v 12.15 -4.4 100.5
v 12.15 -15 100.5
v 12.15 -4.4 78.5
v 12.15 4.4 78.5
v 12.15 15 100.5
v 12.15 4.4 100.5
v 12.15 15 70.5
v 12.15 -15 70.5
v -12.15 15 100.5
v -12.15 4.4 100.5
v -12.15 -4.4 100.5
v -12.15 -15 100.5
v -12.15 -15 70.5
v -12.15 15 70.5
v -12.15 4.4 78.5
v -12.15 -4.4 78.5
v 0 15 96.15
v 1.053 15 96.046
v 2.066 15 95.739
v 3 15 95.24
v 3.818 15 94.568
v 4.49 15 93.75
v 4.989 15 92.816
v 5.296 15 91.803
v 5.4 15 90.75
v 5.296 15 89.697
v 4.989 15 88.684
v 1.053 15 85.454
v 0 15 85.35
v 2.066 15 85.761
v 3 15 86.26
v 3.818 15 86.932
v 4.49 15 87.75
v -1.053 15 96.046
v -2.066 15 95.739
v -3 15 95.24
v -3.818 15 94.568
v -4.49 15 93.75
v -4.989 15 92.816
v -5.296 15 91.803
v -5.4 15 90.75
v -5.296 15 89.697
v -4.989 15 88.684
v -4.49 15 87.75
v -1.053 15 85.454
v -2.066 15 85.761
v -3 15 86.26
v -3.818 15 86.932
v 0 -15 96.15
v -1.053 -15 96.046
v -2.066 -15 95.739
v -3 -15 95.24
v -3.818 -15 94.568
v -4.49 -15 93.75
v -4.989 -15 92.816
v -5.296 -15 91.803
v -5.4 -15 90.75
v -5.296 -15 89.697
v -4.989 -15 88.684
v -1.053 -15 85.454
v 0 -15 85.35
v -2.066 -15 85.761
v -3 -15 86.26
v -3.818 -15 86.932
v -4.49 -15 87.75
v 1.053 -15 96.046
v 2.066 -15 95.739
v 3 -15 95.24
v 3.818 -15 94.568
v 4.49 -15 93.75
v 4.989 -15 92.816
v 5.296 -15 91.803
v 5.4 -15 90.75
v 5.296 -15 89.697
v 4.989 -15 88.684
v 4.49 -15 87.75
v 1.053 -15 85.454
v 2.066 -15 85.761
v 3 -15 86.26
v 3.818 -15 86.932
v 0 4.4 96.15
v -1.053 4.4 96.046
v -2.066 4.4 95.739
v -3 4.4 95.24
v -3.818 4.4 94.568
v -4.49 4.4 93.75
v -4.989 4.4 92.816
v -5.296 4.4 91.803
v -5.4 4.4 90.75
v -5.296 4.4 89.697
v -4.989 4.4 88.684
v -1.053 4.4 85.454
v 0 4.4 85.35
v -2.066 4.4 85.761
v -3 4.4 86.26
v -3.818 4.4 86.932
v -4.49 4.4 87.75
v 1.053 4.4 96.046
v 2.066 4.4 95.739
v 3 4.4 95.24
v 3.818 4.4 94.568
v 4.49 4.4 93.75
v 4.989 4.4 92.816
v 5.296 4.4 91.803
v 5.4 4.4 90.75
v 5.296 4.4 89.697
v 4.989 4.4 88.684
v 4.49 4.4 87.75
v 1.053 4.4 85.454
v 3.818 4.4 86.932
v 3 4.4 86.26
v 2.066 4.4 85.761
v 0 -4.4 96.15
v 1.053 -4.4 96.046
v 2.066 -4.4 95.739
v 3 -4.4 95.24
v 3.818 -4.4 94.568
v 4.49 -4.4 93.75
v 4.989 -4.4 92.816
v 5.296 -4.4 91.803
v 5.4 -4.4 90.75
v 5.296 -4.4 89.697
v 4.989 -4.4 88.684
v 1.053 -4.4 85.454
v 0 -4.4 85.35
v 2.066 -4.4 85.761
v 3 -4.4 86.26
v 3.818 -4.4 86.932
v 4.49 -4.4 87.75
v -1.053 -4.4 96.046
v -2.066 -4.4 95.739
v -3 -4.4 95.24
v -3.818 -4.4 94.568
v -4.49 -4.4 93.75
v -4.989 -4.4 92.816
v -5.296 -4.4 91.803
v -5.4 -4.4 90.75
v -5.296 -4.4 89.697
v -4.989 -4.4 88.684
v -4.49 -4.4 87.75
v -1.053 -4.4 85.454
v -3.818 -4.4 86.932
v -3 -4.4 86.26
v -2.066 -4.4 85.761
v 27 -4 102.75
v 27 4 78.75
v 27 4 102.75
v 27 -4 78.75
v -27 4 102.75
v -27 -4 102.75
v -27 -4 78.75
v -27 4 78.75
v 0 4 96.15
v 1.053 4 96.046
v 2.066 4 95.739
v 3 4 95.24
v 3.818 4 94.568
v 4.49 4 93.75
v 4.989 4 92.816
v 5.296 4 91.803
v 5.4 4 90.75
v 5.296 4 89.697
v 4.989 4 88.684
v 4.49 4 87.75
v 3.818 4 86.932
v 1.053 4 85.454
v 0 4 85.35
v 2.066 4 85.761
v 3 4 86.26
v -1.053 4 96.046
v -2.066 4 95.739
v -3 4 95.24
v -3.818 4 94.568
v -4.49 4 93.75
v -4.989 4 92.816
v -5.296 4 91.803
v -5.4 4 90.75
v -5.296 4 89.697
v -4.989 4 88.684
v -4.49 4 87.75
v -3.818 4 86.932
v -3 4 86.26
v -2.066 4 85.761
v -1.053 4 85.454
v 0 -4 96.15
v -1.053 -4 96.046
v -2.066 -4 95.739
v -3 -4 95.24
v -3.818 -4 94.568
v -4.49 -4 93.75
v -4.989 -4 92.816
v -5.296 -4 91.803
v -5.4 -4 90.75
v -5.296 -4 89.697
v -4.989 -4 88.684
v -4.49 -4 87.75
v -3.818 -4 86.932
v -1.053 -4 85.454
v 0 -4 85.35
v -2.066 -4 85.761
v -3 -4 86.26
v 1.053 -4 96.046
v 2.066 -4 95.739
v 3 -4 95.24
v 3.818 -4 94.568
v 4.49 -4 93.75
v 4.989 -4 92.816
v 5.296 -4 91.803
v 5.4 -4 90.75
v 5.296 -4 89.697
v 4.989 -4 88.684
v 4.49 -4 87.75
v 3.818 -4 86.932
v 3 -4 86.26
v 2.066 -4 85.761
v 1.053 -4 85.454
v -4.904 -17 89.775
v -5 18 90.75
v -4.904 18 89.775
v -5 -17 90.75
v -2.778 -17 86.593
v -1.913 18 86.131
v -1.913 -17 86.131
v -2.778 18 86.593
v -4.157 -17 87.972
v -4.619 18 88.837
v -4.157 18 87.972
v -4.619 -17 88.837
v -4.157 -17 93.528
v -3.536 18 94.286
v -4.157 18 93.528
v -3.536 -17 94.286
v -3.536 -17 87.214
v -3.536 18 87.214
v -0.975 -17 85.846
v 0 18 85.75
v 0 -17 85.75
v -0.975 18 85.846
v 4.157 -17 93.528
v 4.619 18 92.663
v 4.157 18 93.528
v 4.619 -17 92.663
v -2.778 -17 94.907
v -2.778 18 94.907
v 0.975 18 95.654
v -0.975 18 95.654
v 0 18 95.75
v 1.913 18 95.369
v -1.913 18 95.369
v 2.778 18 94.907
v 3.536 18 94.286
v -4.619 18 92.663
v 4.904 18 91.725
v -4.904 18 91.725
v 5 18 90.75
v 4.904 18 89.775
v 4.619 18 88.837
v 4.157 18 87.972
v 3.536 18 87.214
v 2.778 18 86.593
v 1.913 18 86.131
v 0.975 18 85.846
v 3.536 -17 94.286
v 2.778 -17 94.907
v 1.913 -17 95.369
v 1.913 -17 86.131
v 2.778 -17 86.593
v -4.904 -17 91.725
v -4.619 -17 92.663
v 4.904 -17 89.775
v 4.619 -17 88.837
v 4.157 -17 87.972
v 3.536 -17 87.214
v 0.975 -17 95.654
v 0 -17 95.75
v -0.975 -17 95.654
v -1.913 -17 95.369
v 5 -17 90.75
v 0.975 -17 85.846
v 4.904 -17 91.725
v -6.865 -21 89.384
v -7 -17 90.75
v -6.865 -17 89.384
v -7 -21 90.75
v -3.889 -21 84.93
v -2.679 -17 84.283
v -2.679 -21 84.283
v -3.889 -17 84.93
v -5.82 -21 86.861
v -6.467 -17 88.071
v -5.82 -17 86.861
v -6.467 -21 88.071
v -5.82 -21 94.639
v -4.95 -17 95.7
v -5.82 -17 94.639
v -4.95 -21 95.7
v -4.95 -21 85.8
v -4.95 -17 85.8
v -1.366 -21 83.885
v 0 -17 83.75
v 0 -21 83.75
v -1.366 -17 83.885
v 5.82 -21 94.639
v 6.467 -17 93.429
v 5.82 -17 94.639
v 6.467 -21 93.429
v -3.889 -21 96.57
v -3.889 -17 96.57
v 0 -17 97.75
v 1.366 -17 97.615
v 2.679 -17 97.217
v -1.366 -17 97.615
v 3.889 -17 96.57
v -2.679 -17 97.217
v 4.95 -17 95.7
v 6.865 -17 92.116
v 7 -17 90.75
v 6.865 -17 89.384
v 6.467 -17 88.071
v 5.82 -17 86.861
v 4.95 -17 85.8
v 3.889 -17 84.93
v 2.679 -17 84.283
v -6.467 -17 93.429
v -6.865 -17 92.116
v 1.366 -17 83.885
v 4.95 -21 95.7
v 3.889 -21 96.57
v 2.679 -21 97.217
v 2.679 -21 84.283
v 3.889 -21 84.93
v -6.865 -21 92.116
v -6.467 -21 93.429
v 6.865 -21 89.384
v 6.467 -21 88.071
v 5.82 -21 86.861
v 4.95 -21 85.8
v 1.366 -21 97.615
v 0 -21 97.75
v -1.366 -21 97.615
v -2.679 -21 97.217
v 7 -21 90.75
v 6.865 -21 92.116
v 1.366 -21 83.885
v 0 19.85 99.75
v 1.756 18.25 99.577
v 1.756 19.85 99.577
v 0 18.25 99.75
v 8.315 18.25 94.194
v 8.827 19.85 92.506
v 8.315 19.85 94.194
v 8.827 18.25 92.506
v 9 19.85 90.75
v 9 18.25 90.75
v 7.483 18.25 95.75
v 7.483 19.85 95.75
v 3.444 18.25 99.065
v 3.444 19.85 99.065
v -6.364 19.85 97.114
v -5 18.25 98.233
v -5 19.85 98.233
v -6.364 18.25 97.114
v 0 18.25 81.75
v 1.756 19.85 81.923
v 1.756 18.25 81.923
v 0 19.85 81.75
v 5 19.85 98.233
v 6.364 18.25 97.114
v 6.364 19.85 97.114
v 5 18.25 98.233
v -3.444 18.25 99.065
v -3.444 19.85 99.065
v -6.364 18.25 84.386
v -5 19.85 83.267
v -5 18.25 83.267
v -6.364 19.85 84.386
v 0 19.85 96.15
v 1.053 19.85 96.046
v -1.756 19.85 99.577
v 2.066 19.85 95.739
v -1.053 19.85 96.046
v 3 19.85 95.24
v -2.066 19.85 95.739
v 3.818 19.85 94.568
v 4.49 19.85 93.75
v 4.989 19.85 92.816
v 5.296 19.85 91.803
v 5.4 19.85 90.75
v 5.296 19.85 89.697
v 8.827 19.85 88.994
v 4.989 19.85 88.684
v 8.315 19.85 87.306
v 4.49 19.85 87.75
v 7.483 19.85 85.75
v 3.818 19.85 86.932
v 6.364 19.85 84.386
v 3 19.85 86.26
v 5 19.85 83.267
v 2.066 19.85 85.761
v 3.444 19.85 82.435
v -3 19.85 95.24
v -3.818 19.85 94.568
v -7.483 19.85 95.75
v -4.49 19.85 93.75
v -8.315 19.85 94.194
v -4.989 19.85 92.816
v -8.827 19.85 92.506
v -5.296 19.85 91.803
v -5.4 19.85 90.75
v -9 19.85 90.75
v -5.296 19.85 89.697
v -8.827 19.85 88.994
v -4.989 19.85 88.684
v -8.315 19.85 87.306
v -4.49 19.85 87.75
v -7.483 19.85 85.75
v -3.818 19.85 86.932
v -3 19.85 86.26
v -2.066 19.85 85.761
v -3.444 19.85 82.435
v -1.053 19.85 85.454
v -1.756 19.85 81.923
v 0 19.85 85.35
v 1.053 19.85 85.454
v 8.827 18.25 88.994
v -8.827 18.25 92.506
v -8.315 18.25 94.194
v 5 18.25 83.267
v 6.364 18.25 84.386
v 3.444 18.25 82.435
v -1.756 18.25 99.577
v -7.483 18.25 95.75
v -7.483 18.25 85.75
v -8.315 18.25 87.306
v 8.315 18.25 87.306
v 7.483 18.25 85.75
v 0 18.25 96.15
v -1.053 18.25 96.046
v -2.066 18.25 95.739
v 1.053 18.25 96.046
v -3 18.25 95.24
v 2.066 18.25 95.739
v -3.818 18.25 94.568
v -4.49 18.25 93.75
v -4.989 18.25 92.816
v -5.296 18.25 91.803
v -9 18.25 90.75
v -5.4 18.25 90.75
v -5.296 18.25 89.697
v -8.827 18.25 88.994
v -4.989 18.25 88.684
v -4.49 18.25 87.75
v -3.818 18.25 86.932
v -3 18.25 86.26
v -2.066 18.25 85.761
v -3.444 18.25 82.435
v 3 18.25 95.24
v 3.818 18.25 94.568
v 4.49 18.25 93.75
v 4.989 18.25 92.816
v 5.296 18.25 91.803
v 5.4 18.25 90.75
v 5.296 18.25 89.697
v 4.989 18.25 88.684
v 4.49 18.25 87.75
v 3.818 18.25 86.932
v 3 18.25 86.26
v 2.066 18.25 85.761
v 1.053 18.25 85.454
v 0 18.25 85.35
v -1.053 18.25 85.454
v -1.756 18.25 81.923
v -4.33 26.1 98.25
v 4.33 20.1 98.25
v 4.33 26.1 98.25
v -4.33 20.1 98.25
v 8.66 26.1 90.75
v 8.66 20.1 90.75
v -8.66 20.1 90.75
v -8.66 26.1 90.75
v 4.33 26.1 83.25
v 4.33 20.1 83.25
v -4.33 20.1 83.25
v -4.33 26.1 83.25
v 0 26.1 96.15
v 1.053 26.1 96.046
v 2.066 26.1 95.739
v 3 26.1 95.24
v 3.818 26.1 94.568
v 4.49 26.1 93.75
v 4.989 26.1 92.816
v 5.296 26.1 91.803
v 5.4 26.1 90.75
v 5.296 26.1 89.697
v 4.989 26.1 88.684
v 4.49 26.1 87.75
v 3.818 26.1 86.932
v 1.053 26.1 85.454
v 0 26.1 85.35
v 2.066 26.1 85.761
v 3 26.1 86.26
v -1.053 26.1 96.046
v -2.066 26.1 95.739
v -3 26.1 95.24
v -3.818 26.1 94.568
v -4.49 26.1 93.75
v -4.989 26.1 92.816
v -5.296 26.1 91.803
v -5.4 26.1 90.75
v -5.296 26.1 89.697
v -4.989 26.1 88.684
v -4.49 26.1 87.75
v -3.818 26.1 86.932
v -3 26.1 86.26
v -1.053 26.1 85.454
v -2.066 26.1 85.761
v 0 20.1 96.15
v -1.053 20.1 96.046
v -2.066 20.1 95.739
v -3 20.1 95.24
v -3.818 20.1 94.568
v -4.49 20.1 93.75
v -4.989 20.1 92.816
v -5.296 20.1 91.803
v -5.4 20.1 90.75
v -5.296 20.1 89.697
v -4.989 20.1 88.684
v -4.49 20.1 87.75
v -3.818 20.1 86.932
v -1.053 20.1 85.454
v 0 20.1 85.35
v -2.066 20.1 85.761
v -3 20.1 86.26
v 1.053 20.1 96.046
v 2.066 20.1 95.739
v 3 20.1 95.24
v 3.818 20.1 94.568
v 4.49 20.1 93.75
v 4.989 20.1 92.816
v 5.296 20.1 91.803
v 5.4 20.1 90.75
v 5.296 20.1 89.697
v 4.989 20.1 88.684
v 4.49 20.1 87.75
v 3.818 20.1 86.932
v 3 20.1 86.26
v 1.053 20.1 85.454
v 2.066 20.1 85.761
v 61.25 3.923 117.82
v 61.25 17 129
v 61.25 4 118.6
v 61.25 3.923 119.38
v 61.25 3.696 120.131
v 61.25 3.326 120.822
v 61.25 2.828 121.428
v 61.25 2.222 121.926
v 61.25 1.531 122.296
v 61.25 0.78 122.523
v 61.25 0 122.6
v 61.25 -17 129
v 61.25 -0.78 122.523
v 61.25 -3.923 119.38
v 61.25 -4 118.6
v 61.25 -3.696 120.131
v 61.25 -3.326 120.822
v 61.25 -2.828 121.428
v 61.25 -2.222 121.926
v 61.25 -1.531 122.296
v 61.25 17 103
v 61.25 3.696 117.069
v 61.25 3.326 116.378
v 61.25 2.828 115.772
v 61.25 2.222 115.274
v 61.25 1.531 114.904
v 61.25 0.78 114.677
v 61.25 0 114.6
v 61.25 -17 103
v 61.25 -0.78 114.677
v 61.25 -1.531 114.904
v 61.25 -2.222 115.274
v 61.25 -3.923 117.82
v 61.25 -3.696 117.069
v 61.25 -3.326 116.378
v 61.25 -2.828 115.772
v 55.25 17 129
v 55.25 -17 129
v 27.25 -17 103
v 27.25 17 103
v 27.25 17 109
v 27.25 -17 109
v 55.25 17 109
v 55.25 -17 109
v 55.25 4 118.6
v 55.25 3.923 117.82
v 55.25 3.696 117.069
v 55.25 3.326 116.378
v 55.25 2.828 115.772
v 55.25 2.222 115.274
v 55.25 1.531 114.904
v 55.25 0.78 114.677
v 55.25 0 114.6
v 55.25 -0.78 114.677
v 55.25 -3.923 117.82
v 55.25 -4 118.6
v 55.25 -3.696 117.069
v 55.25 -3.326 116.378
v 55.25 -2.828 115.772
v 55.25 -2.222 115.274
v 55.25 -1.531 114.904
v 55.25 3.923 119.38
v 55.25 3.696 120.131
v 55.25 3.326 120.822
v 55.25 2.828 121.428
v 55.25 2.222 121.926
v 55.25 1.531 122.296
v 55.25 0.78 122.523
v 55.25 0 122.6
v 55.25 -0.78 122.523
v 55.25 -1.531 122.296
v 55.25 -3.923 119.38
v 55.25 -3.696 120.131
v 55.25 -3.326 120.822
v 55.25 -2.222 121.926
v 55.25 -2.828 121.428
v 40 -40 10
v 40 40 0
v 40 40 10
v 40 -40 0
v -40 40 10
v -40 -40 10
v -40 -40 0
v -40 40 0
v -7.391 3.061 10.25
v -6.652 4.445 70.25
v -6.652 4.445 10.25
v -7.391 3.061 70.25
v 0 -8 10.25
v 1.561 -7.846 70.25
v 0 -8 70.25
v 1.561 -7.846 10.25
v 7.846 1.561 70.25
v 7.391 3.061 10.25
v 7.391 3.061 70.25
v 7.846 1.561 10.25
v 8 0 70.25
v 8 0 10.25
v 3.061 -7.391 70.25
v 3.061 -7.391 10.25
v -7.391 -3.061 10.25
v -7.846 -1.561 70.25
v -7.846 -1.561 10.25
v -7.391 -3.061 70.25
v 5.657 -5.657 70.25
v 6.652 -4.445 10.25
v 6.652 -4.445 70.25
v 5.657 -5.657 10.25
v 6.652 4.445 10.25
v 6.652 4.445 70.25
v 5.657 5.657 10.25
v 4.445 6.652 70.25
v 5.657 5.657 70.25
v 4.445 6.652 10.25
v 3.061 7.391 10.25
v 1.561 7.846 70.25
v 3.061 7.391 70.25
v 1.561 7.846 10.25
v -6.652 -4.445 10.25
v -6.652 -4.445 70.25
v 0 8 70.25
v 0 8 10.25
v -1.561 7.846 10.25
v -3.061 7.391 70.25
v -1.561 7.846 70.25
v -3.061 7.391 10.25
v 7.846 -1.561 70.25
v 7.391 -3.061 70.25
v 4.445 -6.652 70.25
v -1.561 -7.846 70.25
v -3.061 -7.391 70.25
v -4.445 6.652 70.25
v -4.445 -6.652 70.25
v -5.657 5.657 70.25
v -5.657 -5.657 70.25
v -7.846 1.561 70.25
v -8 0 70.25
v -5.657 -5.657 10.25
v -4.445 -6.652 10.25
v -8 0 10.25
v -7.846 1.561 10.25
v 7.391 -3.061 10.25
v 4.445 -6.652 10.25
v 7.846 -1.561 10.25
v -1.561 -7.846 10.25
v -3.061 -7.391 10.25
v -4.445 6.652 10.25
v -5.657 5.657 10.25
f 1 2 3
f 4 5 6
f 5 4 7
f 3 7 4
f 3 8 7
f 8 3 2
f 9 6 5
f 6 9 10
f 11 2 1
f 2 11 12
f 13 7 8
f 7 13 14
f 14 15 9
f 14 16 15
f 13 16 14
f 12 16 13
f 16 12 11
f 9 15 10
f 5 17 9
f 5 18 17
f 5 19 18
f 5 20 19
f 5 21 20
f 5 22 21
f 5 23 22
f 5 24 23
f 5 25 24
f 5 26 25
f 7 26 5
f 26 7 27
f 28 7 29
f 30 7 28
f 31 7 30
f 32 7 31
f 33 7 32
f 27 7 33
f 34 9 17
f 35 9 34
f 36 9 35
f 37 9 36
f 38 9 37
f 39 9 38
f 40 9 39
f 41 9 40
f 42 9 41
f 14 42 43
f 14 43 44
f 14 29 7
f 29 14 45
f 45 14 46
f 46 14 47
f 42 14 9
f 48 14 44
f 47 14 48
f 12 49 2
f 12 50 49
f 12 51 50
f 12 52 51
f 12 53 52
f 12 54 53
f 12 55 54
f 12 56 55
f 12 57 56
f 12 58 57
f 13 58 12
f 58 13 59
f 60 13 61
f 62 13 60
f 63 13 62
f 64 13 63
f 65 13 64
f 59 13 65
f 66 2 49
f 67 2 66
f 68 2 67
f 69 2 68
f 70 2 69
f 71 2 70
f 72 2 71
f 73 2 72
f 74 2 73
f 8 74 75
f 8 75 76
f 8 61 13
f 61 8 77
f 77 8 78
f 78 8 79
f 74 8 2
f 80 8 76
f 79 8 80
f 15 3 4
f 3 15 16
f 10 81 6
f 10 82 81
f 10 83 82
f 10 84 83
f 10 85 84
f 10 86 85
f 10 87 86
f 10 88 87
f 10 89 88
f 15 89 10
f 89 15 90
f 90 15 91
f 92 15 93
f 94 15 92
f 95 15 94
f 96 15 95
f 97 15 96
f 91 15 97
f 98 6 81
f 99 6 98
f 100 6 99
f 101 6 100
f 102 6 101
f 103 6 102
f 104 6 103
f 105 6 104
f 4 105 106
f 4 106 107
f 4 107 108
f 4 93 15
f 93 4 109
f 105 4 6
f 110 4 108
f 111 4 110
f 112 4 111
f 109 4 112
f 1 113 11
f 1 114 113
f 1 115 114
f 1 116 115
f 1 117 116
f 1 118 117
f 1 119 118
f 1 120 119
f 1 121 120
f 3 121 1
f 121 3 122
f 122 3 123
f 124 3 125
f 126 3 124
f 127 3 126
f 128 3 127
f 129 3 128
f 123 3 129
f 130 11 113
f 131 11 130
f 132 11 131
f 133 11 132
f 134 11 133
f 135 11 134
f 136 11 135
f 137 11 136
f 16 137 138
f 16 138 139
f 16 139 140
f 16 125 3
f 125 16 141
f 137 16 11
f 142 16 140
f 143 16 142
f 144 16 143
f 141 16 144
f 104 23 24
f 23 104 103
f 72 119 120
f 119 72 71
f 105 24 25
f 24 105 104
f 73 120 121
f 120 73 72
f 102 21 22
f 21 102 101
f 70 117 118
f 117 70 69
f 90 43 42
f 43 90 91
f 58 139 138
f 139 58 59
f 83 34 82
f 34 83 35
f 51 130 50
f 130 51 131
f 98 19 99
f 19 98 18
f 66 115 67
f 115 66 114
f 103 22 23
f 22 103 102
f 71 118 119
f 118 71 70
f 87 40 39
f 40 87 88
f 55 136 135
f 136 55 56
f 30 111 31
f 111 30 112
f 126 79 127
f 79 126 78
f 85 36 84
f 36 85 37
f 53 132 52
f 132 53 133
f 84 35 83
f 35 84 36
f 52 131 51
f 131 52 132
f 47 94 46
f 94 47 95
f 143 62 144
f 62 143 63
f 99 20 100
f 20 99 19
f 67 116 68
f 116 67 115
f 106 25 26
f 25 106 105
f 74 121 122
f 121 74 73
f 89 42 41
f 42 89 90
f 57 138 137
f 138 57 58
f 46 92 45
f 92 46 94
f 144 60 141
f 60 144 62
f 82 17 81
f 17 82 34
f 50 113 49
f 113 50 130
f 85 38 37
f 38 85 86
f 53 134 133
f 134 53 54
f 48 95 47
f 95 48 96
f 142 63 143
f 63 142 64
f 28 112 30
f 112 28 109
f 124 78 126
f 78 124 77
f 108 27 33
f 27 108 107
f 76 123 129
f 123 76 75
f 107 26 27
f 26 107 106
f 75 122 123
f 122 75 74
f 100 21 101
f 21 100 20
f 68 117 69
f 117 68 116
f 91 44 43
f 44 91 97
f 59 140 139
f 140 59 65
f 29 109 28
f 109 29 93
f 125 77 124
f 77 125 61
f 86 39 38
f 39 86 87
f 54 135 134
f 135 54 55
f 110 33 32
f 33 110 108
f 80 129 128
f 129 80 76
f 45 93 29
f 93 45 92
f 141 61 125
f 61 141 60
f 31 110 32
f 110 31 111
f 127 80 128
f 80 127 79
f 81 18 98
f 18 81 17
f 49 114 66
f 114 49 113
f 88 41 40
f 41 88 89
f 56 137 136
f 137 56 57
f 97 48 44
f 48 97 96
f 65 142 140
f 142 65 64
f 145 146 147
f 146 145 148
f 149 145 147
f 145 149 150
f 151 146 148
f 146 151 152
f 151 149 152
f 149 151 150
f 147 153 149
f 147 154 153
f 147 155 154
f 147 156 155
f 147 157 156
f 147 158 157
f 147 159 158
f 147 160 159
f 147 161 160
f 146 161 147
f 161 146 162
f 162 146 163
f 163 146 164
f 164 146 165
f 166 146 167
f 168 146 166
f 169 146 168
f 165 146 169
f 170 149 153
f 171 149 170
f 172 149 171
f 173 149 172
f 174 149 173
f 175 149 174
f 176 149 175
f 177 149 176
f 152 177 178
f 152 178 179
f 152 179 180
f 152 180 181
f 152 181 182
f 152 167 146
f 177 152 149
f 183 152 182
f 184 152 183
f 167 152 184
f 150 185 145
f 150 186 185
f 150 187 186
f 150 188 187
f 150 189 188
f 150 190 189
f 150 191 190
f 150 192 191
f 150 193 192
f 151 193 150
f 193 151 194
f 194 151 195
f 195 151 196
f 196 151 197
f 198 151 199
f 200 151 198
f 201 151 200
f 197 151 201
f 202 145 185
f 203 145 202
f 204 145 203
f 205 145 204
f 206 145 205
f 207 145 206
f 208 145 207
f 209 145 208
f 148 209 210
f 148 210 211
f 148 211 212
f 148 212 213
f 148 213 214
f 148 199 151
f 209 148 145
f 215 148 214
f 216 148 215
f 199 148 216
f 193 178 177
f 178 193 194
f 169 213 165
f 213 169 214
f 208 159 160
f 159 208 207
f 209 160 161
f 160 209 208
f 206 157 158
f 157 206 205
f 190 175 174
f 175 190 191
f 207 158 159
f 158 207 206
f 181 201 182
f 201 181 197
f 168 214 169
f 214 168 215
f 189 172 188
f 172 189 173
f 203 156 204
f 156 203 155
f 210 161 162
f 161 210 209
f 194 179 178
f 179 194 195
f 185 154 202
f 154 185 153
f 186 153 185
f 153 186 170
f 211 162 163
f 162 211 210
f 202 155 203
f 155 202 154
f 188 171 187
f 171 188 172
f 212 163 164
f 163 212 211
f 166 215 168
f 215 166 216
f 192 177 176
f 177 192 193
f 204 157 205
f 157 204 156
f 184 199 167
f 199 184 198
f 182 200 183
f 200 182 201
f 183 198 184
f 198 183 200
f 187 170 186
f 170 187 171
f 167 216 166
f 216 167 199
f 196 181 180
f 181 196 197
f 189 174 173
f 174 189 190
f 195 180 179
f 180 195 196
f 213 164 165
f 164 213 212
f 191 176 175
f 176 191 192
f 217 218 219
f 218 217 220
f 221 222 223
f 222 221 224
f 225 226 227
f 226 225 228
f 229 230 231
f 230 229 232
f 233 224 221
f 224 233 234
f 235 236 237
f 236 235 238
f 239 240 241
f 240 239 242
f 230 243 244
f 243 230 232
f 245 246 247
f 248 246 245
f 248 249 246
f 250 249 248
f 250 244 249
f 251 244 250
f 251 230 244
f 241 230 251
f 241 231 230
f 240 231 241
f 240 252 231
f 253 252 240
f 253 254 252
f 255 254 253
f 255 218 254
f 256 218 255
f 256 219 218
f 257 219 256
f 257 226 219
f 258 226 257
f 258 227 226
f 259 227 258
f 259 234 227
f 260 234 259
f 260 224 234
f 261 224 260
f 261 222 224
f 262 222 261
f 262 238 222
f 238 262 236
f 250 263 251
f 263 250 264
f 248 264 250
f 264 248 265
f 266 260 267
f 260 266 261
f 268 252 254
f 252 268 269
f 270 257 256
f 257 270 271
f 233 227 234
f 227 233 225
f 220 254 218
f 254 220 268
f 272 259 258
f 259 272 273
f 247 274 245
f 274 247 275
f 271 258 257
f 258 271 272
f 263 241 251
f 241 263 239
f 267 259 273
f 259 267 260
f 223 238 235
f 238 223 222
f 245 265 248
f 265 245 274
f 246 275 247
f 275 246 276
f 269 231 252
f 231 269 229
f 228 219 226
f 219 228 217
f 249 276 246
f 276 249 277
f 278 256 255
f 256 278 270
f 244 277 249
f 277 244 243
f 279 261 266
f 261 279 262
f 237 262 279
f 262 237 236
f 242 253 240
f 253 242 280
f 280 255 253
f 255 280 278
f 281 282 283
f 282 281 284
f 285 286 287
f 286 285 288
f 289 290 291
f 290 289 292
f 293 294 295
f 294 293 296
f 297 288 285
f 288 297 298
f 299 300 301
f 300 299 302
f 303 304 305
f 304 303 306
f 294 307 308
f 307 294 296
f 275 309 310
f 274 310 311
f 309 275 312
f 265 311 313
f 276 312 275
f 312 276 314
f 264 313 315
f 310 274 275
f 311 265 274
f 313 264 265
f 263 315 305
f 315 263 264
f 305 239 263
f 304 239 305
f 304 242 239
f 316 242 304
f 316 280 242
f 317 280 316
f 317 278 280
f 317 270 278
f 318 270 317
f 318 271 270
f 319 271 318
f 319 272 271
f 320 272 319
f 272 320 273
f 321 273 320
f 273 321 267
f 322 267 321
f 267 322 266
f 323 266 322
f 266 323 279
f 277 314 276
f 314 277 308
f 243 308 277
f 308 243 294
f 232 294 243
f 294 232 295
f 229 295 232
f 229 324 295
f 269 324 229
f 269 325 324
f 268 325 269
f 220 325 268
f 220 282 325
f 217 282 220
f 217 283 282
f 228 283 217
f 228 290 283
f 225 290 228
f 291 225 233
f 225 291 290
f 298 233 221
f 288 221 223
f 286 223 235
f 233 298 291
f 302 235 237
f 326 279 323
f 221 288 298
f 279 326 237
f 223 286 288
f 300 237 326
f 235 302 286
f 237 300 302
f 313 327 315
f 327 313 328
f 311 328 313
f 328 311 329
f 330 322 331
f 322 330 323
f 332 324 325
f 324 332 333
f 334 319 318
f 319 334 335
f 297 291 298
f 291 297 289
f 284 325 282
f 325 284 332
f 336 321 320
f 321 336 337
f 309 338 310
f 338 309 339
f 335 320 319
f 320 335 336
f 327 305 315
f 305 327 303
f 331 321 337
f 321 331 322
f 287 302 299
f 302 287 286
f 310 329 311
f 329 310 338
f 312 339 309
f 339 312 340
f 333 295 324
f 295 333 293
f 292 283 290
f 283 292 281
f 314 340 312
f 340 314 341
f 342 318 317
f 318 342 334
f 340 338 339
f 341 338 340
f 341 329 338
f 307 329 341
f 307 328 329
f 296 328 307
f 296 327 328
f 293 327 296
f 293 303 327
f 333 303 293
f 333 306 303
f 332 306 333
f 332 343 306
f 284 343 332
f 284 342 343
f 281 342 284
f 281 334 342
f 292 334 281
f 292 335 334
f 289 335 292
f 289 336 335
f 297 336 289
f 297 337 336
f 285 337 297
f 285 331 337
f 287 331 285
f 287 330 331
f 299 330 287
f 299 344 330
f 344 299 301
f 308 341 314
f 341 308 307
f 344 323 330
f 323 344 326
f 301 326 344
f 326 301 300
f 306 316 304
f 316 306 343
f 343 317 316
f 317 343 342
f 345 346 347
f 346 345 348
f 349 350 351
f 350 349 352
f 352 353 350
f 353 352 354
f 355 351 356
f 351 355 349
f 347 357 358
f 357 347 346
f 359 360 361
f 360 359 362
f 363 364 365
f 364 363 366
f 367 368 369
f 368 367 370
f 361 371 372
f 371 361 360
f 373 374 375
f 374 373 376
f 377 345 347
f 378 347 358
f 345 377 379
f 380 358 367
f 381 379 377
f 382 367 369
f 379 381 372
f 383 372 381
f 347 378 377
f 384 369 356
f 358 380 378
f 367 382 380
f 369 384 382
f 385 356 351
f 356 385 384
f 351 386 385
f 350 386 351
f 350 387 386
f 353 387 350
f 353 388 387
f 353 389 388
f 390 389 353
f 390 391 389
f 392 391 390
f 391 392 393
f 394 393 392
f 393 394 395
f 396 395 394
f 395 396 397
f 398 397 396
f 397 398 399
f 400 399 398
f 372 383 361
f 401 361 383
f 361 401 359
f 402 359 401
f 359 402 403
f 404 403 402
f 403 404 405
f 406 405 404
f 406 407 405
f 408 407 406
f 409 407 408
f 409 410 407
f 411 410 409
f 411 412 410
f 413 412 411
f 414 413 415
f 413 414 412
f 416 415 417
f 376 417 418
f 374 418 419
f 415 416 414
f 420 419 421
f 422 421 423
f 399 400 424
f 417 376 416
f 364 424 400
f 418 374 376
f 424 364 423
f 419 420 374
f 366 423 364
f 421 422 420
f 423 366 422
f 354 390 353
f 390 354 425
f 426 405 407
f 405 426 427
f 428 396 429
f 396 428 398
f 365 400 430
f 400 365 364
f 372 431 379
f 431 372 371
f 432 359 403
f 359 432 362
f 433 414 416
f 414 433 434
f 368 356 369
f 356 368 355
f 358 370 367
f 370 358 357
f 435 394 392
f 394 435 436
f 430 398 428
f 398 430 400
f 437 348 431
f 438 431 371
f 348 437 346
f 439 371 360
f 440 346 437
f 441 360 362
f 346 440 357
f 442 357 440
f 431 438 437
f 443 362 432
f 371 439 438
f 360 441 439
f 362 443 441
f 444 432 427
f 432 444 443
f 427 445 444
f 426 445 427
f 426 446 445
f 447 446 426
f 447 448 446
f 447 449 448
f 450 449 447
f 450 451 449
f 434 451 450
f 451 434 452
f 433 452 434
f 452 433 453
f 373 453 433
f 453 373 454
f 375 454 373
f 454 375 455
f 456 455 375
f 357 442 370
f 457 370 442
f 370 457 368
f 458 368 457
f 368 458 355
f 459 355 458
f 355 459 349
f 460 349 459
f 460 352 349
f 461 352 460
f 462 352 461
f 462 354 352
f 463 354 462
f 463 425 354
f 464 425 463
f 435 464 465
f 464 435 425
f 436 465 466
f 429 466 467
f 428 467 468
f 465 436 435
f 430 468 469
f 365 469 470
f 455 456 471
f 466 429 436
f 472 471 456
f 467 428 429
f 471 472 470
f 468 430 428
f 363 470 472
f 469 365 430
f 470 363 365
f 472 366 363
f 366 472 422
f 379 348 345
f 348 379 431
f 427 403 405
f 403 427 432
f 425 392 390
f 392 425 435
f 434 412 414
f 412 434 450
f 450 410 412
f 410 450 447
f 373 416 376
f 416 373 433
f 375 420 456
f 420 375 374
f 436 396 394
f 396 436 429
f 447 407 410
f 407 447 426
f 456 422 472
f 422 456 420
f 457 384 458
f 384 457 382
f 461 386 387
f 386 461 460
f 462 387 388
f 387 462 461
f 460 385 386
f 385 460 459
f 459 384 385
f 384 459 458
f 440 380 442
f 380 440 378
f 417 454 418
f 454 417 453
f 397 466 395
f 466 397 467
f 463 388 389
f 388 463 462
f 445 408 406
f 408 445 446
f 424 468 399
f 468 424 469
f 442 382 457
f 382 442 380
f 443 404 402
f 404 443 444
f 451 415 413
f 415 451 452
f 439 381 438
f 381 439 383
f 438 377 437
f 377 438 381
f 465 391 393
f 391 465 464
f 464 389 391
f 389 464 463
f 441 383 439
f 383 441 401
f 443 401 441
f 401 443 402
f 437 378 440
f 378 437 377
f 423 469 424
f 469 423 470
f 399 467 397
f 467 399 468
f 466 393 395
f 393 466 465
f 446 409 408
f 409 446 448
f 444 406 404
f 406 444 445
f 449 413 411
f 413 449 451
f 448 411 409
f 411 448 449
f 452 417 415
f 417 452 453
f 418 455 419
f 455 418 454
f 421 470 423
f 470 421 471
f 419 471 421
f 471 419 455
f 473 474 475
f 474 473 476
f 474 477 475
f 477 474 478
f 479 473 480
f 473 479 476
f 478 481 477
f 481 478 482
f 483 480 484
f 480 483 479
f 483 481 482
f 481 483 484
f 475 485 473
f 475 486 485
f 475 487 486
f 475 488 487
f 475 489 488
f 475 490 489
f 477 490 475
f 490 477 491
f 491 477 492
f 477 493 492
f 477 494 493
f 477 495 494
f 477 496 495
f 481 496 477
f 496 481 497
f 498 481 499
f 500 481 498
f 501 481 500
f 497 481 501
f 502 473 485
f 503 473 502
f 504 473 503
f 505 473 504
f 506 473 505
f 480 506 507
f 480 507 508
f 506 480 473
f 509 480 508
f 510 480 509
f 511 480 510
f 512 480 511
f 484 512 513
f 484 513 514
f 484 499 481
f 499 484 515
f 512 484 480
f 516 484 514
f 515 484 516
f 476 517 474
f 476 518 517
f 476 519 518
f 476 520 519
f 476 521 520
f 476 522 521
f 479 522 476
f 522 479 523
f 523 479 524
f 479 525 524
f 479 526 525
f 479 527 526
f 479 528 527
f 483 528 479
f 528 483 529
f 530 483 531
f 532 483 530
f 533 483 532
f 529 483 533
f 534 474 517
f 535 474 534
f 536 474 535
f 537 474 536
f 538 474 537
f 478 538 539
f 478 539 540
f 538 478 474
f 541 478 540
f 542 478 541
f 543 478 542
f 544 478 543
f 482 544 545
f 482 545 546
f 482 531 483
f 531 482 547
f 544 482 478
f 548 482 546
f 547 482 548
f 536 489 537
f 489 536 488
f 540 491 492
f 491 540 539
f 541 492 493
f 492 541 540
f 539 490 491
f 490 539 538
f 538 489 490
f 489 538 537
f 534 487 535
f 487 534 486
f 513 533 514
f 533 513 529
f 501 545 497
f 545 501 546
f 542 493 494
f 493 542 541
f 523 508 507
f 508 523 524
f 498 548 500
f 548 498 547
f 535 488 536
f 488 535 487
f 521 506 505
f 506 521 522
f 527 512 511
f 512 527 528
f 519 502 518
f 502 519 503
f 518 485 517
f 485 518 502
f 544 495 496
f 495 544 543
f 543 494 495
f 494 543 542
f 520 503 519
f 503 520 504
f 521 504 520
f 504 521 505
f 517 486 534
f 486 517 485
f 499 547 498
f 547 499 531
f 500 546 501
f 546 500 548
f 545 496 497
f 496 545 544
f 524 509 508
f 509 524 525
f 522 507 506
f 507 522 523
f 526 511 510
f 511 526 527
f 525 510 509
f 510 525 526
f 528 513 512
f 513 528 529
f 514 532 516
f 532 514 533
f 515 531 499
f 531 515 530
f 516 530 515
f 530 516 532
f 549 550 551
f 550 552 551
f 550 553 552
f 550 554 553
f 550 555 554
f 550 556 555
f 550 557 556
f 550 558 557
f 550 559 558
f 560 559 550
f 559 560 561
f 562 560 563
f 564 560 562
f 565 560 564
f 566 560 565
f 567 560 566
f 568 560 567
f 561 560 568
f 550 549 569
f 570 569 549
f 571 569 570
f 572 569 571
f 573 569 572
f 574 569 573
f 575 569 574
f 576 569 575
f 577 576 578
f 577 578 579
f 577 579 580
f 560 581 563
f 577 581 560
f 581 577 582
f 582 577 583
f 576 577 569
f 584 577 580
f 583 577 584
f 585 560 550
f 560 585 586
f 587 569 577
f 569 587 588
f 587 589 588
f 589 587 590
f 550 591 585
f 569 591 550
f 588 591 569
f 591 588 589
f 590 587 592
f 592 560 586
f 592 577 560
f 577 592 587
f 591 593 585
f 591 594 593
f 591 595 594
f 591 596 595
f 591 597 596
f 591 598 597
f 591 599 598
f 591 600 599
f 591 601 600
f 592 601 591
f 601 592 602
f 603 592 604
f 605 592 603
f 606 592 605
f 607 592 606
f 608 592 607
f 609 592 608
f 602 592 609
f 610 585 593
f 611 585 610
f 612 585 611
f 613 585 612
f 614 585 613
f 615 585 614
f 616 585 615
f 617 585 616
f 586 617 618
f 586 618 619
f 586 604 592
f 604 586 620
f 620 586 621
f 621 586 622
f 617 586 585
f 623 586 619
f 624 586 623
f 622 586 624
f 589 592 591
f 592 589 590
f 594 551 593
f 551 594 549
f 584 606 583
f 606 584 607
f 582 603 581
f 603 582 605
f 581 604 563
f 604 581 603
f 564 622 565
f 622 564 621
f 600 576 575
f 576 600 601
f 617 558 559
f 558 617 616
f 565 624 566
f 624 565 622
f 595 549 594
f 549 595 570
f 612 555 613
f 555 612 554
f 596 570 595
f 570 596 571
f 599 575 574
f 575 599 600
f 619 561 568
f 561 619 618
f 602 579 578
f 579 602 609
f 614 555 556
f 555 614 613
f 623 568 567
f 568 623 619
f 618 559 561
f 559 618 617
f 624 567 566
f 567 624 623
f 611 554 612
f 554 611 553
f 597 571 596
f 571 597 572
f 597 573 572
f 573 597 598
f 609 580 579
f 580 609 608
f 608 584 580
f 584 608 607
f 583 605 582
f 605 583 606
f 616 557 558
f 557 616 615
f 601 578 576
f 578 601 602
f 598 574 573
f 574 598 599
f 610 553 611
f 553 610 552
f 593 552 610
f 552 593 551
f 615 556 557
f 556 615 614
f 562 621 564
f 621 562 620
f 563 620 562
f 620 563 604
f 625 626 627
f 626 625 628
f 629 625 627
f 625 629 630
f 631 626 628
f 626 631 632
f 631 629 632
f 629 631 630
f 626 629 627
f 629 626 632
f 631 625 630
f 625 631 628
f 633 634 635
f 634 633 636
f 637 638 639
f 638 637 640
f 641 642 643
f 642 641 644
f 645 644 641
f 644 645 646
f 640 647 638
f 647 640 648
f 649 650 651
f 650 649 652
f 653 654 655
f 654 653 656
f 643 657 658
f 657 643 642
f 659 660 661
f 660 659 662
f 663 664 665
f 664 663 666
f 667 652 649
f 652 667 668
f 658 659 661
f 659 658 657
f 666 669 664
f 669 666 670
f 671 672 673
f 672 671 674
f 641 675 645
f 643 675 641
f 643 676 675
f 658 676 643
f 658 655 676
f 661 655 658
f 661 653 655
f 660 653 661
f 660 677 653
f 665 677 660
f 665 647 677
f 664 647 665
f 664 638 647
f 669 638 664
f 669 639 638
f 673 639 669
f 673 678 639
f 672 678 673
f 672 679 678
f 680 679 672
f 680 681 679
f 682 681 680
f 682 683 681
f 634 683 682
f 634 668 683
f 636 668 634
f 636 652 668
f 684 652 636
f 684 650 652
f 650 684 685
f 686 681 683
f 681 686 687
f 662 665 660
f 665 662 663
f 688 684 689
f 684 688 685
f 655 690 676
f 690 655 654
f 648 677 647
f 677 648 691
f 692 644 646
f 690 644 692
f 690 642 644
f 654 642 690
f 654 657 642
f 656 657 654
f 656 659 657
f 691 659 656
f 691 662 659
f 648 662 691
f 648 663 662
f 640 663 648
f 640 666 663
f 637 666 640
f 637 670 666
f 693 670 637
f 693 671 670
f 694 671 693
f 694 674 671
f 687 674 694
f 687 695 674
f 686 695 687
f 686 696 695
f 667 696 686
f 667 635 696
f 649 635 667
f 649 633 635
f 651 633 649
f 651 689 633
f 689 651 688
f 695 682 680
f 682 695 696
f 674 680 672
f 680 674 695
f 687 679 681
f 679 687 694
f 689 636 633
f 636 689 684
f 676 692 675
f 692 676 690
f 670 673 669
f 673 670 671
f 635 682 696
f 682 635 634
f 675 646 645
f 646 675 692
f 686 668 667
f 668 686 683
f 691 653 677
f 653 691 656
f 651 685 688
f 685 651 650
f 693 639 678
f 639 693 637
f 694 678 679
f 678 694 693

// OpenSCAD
$fn = 32;

// ------------------------------------------------------------------------
// Lamp arm: column d16 x 60 mm, arm 54 mm
// Every part is its own module, assembly() places every instance.
// ------------------------------------------------------------------------

// --- part 1 ---
module lamp_base() {
  difference() {
    translate([-40, -40, 0]) cube([80, 80, 10]);
  }
}

// --- part 2 ---
module lamp_column() {
  cylinder(h = 60, d = 16);
}

// --- part 3 ---
module head_fork() {
  difference() {
    translate([-12.15, -15, 0]) cube([24.3, 30, 30]);
    translate([-13.15, -4.4, 8]) cube([26.3, 8.8, 23]);
    translate([0, 0, 20.25]) rotate([90, 0, 0]) cylinder(h = 32, d = 10.8, center = true);
  }
}

// --- part 4 ---
module lamp_arm() {
  difference() {
    translate([-27, -4, 0]) cube([54, 8, 24]);
    translate([0, 0, 12]) rotate([90, 0, 0]) cylinder(h = 10, d = 10.8, center = true);
  }
}

// --- part 5 ---
module arm_pin() {
  rotate([0, 90, 0]) cylinder(h = 36, d = 10, center = true);
  translate([-21, 0, 0]) rotate([0, 90, 0]) cylinder(h = 4, d = 14);
}

// --- part 6 ---
module arm_washer() {
  difference() {
      translate([0, 0, 0]) cylinder(h = 1.6, d = 18);
      translate([0, 0, -1]) cylinder(h = 3.6, d = 10.8);
    }
}

// --- part 7 ---
module arm_nut() {
  difference() {
    linear_extrude(height = 6) polygon(points = [[8.66, 0], [4.33, 7.5], [-4.33, 7.5], [-8.66, 0], [-4.33, -7.5], [4.33, -7.5]]);
    translate([0, 0, -1]) cylinder(h = 8, d = 10.8);
  }
}

// --- part 8 ---
module shade_bracket() {
  difference() {
    translate([-17, -17, 0]) cube([34, 34, 26]);
    translate([-18, -18, 6]) cube([29, 36, 21]);
    translate([14, 0, 15.6]) rotate([0, 90, 0]) cylinder(h = 8, d = 8, center = true);
  }
}

// --- assembly ---
module assembly() {
  color([0.80, 0.24, 0.20]) translate([0, 0, 0]) rotate([0, 0, 0]) lamp_base();
  color([0.20, 0.45, 0.75]) translate([0, 0, 10.25]) rotate([0, 0, 0]) lamp_column();
  color([0.25, 0.62, 0.32]) translate([0, 0, 70.5]) rotate([0, 0, 0]) head_fork();
  color([0.92, 0.70, 0.18]) translate([0, 0, 78.75]) rotate([0, 0, 0]) lamp_arm();
  color([0.58, 0.35, 0.70]) translate([0, 0, 90.75]) rotate([0, 0, 90]) arm_pin();
  color([0.16, 0.66, 0.66]) translate([0, 19.85, 90.75]) rotate([90, 0, 0]) arm_washer();
  color([0.85, 0.48, 0.18]) translate([0, 26.1, 90.75]) rotate([90, 0, 0]) arm_nut();
  color([0.55, 0.60, 0.65]) translate([44.25, 0, 103]) rotate([0, 0, 0]) shade_bracket();
}

assembly();
